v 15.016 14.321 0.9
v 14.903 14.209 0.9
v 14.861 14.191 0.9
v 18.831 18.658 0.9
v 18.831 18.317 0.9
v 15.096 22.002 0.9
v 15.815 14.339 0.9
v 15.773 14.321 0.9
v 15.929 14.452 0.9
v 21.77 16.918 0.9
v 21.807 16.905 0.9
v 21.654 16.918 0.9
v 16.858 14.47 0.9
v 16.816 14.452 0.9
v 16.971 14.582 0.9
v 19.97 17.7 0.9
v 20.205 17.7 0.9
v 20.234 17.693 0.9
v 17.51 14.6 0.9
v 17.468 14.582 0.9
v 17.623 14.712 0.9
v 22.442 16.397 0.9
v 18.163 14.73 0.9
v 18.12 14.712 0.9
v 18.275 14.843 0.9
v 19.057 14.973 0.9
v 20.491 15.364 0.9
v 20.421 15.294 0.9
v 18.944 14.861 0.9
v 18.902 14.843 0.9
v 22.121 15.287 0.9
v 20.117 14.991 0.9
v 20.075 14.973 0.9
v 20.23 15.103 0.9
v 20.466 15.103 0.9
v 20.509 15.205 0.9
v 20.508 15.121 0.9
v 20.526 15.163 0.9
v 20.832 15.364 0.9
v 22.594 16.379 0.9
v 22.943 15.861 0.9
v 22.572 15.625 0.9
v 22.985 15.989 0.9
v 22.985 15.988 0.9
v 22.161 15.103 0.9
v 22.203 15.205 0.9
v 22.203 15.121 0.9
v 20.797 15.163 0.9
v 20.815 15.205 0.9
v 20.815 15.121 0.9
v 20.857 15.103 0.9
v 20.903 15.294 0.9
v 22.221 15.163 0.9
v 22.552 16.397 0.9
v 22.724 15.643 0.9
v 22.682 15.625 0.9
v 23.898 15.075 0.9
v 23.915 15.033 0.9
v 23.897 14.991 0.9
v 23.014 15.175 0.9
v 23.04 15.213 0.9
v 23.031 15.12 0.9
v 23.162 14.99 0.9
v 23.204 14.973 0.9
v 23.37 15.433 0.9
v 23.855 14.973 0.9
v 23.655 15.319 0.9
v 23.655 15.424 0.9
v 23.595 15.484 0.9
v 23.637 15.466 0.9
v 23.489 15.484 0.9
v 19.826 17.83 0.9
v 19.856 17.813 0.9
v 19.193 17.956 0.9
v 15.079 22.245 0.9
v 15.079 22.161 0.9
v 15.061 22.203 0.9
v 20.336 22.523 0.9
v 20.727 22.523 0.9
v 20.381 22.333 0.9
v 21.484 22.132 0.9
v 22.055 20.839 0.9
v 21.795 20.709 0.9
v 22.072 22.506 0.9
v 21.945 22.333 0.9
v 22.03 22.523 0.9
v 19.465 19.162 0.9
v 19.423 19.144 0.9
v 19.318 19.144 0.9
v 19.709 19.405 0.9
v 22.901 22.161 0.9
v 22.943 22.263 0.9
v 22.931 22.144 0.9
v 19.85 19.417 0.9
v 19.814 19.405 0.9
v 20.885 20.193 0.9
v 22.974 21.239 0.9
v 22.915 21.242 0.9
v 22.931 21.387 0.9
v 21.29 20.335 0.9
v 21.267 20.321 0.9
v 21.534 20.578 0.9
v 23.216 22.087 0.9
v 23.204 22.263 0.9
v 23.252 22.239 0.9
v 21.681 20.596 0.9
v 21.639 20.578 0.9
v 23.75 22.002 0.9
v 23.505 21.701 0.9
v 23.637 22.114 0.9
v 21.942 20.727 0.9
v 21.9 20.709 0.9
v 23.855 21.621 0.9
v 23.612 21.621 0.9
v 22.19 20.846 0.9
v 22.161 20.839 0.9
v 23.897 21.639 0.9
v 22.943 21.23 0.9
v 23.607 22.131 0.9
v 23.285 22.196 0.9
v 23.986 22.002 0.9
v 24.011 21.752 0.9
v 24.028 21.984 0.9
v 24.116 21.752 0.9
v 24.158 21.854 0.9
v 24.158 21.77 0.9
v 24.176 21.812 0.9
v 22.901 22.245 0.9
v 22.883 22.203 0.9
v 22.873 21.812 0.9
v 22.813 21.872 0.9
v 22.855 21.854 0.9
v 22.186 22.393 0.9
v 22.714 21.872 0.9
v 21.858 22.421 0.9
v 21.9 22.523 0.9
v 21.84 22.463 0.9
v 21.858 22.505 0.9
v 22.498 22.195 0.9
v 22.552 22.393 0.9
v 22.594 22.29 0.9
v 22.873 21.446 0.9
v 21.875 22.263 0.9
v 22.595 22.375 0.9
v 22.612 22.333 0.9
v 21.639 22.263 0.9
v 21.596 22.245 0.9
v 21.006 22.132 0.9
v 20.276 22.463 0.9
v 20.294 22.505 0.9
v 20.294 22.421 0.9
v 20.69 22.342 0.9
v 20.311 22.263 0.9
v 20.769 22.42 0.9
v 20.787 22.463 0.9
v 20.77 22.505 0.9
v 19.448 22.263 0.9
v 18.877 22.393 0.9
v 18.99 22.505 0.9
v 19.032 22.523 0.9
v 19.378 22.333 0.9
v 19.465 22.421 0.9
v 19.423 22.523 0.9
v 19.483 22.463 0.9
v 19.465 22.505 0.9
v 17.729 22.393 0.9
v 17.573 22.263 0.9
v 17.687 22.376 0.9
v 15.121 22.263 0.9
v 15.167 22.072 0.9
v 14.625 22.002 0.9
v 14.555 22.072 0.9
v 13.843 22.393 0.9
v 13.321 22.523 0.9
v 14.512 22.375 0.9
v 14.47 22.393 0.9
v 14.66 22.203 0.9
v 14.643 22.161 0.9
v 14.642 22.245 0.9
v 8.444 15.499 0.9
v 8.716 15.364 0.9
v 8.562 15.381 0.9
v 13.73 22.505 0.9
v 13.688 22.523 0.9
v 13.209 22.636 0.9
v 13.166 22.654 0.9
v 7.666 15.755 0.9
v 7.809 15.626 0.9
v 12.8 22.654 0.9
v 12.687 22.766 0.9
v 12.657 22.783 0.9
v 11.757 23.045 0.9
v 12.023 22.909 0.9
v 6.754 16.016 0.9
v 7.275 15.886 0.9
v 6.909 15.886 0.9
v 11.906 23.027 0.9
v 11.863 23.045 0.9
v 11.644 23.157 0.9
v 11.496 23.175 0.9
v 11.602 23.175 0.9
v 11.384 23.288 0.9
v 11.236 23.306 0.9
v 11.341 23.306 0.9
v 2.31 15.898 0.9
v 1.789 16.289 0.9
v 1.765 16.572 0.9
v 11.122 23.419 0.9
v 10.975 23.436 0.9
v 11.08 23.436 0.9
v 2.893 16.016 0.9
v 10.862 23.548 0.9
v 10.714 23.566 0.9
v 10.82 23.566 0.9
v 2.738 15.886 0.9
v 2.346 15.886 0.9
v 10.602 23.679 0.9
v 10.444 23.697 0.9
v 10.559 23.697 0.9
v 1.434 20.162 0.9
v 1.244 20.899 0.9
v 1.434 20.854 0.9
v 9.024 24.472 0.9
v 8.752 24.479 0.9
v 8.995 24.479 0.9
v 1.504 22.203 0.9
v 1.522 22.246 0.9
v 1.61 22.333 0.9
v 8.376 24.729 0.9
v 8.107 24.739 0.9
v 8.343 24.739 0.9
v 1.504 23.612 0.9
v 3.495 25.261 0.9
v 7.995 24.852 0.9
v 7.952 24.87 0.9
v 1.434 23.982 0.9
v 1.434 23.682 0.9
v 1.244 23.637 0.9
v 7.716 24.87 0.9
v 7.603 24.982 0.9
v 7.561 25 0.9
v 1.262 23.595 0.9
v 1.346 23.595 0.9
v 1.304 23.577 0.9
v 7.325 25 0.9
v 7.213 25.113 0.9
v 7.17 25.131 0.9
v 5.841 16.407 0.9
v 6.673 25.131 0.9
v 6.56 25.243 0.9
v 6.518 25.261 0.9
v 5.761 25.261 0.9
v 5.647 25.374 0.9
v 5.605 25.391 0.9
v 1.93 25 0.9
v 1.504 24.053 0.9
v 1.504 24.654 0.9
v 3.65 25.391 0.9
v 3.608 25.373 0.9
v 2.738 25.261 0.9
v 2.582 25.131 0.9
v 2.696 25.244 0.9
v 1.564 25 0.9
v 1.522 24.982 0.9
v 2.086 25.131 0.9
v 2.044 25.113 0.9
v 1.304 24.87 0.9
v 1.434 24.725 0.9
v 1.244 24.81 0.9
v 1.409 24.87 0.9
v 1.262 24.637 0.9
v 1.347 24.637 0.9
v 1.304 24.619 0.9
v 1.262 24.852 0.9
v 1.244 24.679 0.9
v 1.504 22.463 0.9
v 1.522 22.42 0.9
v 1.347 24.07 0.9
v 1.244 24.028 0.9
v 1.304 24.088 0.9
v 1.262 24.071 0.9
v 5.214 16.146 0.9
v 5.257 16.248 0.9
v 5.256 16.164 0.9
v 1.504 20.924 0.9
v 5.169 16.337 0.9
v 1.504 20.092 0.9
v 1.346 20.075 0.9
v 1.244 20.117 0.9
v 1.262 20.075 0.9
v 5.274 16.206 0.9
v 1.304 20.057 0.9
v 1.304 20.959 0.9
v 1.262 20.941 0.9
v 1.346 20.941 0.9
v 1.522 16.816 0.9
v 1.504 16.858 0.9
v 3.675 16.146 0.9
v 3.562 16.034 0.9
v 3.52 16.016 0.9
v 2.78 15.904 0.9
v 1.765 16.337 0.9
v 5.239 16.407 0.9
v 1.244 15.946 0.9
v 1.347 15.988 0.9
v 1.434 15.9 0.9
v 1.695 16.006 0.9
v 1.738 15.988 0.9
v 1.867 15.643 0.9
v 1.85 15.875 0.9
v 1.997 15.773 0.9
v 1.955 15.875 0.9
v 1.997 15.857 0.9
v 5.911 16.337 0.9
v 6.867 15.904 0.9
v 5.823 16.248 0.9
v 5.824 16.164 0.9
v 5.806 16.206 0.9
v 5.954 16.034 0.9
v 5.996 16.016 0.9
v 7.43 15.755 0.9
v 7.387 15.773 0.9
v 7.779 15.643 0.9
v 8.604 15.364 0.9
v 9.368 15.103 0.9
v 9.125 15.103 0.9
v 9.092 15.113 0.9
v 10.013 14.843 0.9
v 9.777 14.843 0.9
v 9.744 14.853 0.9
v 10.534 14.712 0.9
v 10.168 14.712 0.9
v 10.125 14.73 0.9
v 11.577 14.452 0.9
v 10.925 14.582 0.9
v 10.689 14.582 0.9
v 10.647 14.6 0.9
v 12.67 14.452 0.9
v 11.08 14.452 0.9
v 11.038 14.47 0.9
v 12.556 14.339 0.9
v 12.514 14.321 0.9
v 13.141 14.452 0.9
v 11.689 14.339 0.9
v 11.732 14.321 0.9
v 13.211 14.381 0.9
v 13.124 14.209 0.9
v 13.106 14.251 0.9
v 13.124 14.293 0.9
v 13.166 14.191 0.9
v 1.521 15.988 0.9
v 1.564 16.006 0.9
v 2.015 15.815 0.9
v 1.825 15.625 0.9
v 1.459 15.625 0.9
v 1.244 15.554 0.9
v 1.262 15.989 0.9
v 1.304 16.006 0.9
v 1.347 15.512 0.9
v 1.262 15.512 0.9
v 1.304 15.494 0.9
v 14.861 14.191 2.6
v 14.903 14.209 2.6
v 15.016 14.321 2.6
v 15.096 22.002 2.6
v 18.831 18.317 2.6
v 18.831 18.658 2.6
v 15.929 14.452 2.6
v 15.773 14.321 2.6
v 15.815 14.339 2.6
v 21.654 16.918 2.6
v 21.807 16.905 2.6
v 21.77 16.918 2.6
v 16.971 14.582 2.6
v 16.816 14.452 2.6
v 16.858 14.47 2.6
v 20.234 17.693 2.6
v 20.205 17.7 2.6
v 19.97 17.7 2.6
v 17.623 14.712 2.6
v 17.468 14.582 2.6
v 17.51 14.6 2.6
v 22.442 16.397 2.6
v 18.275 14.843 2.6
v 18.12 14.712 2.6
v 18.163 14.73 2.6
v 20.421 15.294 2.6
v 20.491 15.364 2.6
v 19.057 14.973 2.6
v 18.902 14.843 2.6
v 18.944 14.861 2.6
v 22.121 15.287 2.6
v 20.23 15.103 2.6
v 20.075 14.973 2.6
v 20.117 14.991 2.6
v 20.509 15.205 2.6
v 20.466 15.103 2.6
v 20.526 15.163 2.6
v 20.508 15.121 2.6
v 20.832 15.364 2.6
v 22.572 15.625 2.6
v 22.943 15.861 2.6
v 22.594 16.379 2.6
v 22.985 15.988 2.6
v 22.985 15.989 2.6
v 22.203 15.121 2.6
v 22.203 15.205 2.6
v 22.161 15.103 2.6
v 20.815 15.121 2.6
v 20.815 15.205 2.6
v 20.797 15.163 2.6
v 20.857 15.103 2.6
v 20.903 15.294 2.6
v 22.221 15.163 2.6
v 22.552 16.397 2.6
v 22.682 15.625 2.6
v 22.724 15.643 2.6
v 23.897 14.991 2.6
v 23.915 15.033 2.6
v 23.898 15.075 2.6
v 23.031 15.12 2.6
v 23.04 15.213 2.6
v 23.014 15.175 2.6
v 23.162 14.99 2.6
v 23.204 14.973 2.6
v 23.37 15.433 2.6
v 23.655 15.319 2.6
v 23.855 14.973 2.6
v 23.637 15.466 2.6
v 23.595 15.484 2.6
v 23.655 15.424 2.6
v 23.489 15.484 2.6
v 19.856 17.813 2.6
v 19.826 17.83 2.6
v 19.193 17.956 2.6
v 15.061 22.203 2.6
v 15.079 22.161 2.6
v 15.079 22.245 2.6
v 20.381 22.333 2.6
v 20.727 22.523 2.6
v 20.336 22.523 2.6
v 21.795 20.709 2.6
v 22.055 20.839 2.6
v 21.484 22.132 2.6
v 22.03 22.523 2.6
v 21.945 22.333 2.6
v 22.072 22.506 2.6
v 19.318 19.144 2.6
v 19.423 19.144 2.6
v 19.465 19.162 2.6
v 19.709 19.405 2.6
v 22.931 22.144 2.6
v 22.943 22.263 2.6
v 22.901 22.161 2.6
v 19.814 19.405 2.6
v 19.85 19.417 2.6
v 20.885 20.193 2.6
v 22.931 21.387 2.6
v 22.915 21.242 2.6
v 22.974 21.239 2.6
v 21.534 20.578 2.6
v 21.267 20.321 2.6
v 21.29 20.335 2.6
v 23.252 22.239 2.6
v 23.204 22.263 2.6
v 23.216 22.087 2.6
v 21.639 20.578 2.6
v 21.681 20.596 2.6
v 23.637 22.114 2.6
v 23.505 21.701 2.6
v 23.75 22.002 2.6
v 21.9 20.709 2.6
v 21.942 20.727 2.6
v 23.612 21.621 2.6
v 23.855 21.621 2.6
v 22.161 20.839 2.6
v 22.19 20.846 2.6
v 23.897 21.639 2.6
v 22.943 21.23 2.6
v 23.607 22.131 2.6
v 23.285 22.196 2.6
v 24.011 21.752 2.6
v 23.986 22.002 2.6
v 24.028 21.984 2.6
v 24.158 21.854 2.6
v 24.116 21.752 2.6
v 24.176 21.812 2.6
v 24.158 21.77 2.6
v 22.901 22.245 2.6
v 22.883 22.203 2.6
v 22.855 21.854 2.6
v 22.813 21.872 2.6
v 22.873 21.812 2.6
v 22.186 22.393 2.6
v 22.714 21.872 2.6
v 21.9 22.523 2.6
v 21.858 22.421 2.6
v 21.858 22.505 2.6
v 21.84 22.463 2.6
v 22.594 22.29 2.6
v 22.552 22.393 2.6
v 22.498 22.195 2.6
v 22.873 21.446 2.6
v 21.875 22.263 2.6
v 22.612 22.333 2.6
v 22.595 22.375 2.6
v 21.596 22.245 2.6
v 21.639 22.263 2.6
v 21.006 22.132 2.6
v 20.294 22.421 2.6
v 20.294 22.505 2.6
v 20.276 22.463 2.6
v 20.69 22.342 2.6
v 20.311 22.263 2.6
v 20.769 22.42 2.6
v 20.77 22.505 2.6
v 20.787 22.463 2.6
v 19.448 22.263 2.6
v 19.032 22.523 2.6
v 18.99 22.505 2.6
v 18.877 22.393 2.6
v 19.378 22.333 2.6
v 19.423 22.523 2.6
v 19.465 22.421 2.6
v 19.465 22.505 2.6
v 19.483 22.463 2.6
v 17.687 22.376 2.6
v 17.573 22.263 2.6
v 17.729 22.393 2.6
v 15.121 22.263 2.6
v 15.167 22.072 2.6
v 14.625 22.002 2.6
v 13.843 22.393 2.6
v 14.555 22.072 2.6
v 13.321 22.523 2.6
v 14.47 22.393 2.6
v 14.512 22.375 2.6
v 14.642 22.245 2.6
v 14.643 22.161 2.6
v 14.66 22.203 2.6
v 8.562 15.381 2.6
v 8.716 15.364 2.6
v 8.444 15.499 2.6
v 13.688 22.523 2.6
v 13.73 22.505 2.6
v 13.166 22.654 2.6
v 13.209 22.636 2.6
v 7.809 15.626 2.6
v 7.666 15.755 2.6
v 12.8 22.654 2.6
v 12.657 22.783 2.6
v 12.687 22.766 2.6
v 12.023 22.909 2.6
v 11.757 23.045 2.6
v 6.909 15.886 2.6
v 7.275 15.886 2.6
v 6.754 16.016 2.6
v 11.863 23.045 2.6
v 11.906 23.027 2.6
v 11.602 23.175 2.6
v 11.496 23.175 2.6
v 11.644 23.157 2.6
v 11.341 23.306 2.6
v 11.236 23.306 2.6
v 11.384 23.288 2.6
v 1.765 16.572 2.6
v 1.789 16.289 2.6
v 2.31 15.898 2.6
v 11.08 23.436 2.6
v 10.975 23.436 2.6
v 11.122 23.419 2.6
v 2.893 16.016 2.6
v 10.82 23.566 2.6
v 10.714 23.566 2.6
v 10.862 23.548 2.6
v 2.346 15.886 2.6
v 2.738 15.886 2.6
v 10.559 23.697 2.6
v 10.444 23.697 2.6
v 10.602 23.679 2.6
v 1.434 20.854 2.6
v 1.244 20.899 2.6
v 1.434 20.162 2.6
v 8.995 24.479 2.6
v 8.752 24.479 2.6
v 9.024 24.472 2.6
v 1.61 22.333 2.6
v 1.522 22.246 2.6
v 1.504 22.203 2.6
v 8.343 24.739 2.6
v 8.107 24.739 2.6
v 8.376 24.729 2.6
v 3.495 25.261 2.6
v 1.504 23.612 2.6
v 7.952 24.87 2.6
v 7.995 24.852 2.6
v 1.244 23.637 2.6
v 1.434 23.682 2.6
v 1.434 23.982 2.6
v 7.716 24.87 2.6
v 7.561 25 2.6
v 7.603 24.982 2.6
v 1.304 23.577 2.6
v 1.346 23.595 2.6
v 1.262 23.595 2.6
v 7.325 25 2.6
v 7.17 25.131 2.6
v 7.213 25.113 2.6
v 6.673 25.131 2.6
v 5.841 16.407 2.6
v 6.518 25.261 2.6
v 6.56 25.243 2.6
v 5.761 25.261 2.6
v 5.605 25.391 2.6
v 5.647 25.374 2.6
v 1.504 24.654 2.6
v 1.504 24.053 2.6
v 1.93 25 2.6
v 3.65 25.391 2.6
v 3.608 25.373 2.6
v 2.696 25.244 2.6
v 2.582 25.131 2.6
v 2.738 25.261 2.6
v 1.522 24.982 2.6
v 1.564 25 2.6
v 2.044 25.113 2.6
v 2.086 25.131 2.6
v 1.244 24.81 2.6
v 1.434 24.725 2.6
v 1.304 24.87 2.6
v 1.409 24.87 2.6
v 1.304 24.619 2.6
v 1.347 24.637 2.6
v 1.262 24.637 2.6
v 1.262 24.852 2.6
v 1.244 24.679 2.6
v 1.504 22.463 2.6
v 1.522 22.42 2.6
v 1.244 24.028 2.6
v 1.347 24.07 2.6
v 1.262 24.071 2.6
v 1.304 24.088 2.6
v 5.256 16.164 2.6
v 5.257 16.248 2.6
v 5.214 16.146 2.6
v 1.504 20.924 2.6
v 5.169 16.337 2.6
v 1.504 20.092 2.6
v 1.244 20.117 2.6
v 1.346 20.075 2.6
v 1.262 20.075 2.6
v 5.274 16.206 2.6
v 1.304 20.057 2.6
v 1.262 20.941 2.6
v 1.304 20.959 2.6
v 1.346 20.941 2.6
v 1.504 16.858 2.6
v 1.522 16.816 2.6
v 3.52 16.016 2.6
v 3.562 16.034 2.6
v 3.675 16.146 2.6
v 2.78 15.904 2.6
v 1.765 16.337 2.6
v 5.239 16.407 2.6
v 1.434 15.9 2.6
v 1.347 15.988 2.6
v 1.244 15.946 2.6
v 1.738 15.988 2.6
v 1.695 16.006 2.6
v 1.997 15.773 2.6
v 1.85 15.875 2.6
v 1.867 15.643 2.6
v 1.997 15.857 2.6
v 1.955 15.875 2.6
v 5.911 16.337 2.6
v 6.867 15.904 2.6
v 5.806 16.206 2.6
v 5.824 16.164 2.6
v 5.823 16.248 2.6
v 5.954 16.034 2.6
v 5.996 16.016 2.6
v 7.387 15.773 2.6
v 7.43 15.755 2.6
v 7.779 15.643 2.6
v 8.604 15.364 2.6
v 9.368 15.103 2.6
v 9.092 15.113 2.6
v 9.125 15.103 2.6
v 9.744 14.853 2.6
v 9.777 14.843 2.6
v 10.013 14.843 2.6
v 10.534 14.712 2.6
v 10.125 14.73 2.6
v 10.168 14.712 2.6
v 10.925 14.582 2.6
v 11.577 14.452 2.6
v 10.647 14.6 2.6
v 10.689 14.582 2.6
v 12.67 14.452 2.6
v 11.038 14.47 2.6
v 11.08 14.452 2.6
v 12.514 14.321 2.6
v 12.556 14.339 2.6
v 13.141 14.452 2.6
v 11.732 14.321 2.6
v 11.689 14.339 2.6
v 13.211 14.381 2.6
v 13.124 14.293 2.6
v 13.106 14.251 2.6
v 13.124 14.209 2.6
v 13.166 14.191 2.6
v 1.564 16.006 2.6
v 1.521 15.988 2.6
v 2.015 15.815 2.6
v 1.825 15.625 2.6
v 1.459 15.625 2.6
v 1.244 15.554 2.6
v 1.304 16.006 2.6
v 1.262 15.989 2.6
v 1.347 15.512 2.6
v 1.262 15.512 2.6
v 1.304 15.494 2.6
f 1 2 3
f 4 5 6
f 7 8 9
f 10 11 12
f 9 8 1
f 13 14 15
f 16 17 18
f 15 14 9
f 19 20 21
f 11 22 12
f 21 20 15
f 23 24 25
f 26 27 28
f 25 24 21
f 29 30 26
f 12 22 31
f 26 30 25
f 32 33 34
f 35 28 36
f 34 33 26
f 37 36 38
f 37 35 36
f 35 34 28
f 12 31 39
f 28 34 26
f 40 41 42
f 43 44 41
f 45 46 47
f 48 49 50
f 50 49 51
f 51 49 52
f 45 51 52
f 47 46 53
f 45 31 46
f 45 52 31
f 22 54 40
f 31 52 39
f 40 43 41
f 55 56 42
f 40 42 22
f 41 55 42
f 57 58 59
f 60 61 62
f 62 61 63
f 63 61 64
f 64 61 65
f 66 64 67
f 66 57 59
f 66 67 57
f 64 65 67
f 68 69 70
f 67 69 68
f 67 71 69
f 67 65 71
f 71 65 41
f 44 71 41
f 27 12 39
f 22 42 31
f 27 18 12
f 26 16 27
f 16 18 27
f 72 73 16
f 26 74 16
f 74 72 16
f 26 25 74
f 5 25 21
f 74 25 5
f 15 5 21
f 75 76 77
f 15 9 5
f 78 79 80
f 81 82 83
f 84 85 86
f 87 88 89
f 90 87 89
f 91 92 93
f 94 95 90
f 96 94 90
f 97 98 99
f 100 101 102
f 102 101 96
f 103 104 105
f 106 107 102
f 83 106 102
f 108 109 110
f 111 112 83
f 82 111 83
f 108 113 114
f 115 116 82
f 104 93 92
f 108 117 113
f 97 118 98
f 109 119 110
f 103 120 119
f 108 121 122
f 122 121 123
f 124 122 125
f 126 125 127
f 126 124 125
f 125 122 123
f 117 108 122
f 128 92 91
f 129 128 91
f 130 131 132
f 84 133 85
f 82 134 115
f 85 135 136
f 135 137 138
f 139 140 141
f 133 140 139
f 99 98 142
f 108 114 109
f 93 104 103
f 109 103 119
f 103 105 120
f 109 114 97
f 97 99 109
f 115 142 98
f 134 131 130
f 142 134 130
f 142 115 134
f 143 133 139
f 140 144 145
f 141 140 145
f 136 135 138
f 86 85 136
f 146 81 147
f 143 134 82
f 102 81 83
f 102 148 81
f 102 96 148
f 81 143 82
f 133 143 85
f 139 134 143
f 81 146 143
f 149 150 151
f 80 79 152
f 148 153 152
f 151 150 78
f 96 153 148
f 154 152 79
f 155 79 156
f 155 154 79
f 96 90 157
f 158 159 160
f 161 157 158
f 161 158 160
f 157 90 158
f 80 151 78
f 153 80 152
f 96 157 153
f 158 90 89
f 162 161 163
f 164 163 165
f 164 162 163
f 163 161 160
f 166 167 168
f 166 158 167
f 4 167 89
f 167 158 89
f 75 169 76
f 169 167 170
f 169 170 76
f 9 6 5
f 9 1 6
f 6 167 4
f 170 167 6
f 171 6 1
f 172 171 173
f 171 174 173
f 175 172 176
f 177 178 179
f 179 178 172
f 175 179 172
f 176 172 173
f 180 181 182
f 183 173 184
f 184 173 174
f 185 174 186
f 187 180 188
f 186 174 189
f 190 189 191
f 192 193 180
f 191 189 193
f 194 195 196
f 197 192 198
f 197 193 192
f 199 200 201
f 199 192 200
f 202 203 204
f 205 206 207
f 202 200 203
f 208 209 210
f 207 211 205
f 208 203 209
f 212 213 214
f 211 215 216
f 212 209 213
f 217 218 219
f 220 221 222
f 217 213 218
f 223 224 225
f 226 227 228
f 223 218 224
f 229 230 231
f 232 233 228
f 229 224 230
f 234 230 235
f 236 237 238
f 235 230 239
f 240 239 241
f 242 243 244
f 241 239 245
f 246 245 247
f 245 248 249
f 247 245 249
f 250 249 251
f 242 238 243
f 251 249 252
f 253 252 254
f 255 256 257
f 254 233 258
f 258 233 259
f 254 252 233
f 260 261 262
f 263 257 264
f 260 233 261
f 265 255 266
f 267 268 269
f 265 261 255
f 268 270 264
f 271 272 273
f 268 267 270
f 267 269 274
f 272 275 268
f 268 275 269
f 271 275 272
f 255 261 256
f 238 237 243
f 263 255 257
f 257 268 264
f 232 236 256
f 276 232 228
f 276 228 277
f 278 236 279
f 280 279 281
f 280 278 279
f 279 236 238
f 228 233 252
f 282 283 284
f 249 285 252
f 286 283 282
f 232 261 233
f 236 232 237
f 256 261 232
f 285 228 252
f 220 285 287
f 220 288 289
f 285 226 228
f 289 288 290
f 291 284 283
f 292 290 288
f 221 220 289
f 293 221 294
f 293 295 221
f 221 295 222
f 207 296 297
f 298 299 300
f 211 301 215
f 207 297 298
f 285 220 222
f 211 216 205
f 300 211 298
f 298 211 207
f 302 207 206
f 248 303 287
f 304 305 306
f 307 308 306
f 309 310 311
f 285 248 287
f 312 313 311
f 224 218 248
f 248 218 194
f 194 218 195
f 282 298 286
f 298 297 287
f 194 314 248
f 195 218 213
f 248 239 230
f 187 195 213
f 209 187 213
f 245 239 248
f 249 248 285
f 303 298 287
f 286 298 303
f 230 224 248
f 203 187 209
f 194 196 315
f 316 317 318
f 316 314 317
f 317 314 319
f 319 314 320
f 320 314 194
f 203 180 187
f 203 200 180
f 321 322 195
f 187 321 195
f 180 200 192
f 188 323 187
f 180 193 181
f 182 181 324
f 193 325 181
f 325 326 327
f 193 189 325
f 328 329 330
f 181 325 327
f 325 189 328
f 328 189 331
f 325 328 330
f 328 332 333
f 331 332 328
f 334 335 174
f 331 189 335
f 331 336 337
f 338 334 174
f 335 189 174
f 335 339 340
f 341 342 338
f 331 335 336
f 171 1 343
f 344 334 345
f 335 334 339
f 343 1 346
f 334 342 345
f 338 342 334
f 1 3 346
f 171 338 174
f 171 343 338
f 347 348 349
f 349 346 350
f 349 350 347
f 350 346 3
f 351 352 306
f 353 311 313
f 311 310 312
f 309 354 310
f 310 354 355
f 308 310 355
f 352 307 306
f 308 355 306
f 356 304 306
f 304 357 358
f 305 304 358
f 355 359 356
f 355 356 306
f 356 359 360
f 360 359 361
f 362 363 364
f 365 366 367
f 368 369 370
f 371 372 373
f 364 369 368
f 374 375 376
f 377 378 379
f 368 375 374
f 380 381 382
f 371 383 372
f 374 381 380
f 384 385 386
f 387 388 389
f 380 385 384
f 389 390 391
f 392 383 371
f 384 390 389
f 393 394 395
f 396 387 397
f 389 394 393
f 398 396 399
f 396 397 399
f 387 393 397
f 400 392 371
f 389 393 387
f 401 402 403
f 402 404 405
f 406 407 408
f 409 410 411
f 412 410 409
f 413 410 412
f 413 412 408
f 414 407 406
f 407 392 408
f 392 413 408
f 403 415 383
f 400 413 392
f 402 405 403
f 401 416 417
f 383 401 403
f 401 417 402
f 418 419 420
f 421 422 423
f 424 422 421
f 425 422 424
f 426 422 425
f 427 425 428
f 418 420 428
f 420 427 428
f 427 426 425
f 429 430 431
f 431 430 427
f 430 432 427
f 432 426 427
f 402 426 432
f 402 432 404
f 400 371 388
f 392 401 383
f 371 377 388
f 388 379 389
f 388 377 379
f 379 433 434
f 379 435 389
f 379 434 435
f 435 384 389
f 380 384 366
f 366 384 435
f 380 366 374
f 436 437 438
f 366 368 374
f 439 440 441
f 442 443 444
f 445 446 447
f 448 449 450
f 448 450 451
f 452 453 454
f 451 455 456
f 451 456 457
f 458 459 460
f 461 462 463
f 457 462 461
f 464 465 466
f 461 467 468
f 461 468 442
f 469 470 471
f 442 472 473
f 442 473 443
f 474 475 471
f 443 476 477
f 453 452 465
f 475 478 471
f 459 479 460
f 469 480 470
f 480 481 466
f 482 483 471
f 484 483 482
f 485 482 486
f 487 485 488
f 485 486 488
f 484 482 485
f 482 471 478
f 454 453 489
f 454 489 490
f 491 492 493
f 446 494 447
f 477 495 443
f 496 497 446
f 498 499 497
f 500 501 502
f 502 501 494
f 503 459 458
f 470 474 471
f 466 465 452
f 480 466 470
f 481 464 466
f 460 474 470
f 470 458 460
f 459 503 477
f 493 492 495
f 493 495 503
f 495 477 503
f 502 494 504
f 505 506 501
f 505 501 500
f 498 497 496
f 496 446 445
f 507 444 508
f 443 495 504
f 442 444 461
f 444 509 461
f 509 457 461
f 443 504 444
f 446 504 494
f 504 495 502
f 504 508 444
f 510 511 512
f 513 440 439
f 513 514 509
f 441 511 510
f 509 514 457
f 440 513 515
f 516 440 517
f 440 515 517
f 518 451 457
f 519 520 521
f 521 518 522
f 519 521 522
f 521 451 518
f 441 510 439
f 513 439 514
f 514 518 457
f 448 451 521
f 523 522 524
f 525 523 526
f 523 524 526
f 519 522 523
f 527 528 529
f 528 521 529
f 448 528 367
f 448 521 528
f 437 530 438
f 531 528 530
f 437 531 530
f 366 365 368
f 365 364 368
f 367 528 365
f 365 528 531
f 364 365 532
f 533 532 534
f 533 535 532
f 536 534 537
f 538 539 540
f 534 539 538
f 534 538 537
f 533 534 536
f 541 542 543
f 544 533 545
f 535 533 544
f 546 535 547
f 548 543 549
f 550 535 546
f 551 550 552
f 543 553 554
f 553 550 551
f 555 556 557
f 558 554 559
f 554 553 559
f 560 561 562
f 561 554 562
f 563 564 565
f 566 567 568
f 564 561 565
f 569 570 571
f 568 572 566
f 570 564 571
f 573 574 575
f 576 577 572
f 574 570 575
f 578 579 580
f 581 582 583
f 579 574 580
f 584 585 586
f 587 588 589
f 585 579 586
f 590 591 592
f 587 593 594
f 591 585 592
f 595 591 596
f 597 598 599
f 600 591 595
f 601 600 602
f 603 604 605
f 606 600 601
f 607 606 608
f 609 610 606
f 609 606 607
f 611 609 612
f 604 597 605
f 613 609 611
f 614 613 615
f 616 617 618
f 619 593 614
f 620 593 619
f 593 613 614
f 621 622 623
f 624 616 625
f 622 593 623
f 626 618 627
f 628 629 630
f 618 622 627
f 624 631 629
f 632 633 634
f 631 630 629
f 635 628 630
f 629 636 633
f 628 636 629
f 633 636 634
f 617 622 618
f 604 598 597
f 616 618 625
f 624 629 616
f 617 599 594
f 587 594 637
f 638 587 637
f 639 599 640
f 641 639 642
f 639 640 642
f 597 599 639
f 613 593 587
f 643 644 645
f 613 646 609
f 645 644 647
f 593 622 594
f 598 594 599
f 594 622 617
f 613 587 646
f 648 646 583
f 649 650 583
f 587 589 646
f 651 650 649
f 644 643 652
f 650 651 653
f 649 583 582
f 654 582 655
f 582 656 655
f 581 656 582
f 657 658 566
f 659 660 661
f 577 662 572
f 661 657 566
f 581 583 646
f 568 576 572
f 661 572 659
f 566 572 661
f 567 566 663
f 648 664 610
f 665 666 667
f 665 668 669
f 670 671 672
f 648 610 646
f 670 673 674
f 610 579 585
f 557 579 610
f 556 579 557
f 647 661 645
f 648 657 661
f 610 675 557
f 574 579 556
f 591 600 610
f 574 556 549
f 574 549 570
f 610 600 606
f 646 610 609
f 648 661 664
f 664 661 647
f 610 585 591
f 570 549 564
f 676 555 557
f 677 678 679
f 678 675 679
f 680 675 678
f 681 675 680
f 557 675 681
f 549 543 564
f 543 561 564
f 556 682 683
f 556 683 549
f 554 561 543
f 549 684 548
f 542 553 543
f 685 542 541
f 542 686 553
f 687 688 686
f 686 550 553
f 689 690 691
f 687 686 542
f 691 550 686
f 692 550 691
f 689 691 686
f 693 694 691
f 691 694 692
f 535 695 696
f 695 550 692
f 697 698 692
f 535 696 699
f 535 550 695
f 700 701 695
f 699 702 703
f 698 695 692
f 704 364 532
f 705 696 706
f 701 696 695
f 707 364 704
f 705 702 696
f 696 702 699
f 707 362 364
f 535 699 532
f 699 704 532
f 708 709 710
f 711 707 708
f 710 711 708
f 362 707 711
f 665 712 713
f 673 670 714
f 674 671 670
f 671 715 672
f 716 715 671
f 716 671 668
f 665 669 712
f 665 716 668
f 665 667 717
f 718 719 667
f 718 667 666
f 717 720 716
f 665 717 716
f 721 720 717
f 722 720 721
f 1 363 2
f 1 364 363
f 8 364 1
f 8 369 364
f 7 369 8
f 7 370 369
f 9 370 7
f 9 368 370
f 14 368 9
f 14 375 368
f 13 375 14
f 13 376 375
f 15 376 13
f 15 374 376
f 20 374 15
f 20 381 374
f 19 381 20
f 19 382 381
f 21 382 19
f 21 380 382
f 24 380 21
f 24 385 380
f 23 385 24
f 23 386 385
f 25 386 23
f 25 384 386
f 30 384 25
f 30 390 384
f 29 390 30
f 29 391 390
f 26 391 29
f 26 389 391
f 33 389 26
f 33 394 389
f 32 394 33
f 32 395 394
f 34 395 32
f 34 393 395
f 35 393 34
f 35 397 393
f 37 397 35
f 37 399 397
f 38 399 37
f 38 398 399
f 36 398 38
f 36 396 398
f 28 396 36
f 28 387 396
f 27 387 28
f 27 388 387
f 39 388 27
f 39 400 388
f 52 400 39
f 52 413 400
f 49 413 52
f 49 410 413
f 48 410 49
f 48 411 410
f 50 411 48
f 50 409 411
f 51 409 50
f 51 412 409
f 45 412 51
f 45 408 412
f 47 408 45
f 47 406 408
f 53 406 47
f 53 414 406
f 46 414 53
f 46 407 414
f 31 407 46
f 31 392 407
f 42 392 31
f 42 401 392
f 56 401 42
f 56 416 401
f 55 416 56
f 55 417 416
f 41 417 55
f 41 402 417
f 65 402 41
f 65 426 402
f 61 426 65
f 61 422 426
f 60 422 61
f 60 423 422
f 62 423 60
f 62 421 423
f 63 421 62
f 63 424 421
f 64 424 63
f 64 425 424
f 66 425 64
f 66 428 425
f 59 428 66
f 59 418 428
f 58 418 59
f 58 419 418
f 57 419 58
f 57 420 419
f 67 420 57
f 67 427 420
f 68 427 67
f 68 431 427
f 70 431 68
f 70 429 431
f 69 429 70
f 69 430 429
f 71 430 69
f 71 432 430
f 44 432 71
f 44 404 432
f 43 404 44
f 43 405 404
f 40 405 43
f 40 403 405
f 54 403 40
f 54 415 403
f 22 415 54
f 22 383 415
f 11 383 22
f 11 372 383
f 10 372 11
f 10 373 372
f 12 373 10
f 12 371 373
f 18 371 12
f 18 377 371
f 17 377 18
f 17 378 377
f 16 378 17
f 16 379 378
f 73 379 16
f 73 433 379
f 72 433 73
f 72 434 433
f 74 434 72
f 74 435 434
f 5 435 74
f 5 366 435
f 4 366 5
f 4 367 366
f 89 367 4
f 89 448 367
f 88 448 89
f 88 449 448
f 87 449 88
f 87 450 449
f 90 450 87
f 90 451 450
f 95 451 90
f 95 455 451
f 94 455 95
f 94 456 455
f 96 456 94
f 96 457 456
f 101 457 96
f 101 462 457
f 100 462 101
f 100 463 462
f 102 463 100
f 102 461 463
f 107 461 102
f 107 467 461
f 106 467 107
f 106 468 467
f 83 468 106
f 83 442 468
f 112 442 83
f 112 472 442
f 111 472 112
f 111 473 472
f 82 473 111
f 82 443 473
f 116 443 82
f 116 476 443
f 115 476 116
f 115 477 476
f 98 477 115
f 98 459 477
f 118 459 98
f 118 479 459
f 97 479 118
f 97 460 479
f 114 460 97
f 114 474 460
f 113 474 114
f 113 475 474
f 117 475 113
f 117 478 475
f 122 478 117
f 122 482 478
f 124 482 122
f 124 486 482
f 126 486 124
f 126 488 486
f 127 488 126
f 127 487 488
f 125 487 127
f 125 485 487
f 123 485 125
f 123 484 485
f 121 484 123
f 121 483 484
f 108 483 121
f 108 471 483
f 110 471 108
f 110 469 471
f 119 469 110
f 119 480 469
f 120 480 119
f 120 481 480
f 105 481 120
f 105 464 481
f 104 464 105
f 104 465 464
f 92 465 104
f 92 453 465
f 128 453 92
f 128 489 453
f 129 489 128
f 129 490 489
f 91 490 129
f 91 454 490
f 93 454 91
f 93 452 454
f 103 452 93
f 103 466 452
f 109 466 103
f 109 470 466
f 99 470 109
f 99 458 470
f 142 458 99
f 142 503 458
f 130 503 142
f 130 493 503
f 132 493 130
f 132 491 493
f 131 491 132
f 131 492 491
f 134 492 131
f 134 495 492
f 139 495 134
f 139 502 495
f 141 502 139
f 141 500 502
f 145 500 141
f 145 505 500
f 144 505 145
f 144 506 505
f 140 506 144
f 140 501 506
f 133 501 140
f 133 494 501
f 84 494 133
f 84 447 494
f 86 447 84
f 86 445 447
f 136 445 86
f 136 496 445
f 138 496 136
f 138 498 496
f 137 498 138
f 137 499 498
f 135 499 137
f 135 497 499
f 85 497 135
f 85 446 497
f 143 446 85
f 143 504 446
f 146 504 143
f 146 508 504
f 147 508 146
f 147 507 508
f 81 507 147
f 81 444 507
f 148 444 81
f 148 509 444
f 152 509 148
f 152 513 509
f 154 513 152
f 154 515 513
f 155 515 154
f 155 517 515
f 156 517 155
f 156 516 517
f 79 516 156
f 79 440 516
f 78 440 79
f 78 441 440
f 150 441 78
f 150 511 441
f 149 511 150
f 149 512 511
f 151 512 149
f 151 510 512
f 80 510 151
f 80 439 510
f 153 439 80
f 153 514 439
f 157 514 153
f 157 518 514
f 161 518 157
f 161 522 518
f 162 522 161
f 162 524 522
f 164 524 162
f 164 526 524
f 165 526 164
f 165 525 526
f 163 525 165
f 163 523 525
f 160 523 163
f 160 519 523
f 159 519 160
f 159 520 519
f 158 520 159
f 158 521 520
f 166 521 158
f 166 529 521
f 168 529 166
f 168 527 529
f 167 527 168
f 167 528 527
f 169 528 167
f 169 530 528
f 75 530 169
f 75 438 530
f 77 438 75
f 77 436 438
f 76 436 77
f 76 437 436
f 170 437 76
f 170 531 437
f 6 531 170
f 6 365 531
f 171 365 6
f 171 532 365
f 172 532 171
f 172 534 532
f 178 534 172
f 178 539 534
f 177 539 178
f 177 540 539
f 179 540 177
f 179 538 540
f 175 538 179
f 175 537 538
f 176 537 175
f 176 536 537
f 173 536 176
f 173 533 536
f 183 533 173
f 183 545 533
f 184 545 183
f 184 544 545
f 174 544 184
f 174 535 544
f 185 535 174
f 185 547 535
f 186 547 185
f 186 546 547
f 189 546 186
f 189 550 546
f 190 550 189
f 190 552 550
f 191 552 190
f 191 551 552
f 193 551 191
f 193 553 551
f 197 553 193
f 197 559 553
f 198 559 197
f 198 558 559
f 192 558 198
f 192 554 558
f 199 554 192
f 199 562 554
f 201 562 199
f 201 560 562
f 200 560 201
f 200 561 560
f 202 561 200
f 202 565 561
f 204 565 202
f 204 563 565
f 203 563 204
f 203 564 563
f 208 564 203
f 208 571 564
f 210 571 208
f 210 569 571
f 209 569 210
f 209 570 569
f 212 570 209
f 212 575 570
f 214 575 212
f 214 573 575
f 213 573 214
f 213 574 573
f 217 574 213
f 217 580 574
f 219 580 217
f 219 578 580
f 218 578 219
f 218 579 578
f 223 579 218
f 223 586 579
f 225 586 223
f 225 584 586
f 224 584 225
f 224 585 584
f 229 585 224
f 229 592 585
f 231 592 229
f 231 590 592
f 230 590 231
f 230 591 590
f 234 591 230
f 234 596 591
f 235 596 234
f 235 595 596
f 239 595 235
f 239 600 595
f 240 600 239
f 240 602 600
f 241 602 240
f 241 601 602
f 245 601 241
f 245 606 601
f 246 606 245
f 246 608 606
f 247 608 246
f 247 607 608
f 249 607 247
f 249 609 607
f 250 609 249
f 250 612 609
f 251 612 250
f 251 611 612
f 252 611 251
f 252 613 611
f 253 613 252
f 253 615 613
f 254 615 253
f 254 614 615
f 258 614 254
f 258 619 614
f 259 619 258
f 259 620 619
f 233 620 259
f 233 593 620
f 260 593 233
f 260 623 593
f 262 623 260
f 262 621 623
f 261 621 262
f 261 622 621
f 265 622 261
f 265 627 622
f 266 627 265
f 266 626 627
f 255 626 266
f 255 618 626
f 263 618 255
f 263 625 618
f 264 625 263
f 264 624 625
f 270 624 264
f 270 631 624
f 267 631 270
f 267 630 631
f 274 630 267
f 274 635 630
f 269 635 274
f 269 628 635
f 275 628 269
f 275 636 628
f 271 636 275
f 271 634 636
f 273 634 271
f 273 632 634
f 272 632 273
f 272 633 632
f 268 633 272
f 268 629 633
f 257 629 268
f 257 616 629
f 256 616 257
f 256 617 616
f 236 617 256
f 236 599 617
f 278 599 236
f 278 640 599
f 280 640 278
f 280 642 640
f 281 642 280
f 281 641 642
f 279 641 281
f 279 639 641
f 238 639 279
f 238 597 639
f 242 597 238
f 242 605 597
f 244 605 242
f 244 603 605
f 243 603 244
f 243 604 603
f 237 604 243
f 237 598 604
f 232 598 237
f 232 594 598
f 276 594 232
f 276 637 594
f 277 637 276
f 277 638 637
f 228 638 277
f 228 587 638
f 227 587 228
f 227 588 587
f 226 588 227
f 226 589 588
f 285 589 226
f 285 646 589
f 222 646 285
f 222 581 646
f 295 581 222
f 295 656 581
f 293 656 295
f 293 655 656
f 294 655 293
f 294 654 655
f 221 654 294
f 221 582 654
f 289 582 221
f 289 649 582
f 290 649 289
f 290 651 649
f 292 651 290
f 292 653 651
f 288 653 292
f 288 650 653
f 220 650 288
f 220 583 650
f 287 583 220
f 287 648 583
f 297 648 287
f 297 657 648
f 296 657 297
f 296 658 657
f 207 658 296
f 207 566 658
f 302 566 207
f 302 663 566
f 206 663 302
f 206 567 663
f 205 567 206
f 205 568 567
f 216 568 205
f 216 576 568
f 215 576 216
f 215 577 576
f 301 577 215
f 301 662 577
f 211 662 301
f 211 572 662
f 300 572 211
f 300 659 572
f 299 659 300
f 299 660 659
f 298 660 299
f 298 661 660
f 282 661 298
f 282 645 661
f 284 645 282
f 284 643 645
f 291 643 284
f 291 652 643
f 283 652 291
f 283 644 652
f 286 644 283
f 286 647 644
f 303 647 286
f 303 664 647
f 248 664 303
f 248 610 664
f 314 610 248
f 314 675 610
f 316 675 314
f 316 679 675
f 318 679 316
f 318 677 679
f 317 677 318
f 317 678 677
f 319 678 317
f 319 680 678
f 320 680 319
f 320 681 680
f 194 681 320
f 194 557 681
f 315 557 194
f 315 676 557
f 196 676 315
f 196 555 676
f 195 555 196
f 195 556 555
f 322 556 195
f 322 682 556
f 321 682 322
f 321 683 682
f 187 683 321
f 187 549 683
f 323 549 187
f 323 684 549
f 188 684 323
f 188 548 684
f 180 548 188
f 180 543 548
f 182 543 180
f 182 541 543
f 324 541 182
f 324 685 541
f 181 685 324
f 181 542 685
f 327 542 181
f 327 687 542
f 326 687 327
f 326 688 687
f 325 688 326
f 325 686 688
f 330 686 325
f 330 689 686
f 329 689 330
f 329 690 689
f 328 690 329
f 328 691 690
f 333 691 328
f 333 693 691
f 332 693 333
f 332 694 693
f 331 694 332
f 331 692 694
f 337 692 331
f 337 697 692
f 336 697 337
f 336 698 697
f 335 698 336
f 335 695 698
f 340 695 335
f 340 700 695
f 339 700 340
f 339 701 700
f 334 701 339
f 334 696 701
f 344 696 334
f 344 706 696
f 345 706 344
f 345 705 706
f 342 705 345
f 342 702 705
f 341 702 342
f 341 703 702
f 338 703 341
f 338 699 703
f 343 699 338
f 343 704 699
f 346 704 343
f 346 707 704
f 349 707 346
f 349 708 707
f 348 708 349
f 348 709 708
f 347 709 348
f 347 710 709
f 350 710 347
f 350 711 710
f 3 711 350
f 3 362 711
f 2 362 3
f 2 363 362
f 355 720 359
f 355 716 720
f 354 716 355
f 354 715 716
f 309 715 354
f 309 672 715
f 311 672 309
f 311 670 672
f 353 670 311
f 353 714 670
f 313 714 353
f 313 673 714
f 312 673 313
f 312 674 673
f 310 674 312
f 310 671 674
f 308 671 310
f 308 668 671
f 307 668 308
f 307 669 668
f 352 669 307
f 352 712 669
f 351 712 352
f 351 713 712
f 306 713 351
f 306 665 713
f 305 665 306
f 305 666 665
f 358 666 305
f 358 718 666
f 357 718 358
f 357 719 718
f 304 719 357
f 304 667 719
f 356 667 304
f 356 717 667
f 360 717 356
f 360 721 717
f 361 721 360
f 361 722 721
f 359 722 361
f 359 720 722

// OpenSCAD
$fn = 24;
translate([0, -2.500, 0.900])
  linear_extrude(height=1.700) {
offset(r=0.06, $fn=8) {
    polygon(points=[[1.304,27.310],[1.304,18.054],[1.434,18.185],[1.825,18.185],[1.955,18.315],[2.216,18.315],[2.346,18.446],[2.738,18.446],[2.868,18.576],[3.520,18.576],[3.650,18.706],[5.866,18.706],[5.996,18.576],[6.779,18.576],[6.909,18.446],[7.300,18.446],[7.430,18.315],[7.691,18.315],[7.821,18.185],[8.473,18.054],[8.604,17.924],[8.734,17.924],[9.125,17.663],[9.386,17.663],[9.777,17.403],[10.038,17.403],[10.168,17.272],[10.559,17.272],[10.689,17.142],[10.950,17.142],[11.080,17.012],[11.602,17.012],[11.732,16.881],[12.514,16.881],[12.645,17.012],[13.166,17.012],[13.296,16.881],[13.166,16.751],[12.905,16.751],[14.861,16.751],[14.991,16.881],[15.773,16.881],[15.904,17.012],[16.816,17.012],[16.946,17.142],[17.468,17.142],[17.598,17.272],[18.120,17.272],[18.250,17.403],[18.902,17.403],[19.032,17.533],[20.075,17.533],[20.205,17.663],[23.073,17.663],[23.204,17.533],[23.855,17.533],[23.595,17.794],[23.595,17.924],[23.464,17.924],[22.552,18.837],[22.421,18.837],[21.770,19.358],[21.639,19.358],[20.205,20.140],[19.945,20.140],[19.814,20.271],[19.163,20.401],[18.771,20.792],[18.771,21.183],[19.293,21.704],[19.423,21.704],[19.684,21.965],[19.814,21.965],[20.857,22.747],[21.248,22.878],[21.509,23.138],[21.639,23.138],[21.770,23.269],[21.900,23.269],[22.030,23.399],[22.161,23.399],[23.595,24.181],[23.855,24.181],[23.986,24.312],[24.116,24.312],[23.986,24.442],[23.725,24.442],[23.595,24.572],[22.943,24.703],[23.204,24.703],[23.595,24.181],[22.943,23.790],[22.813,23.921],[22.813,24.312],[22.682,24.312],[22.421,24.703],[22.552,24.833],[22.682,24.833],[22.161,24.833],[22.030,24.963],[19.032,24.963],[18.902,24.833],[17.729,24.833],[17.598,24.703],[14.600,24.703],[14.470,24.833],[13.818,24.833],[13.688,24.963],[13.296,24.963],[13.166,25.094],[12.775,25.094],[12.645,25.224],[11.993,25.354],[11.863,25.485],[11.732,25.485],[11.602,25.615],[11.471,25.615],[11.341,25.746],[11.211,25.746],[11.080,25.876],[10.950,25.876],[10.820,26.006],[10.689,26.006],[10.559,26.137],[10.429,26.137],[8.995,26.919],[8.734,26.919],[8.343,27.179],[8.082,27.179],[7.952,27.310],[7.691,27.310],[7.561,27.440],[7.300,27.440],[7.170,27.571],[6.648,27.571],[6.518,27.701],[5.736,27.701],[5.605,27.831],[3.650,27.831],[3.520,27.701],[2.738,27.701],[2.607,27.571],[2.086,27.571],[1.955,27.440],[1.564,27.440],[1.434,27.310],[20.336,17.794],[20.466,17.924],[20.857,17.924],[20.988,17.794],[20.857,17.663],[20.466,17.663],[23.464,17.924],[23.073,17.663],[22.161,17.663],[22.030,17.794],[22.552,18.185],[22.682,18.185],[22.943,18.446],[5.084,18.837],[5.214,18.967],[5.866,18.967],[5.996,18.837],[5.866,18.706],[5.214,18.706],[1.434,22.747],[1.564,22.617],[1.564,19.358],[1.825,19.097],[1.825,18.837],[2.346,18.446],[2.216,18.315],[1.825,18.315],[1.695,18.446],[1.564,18.446],[1.434,18.315],[1.304,18.446],[1.304,22.617],[14.470,24.572],[14.600,24.703],[15.121,24.703],[15.252,24.572],[15.121,24.442],[14.600,24.442],[20.596,24.833],[20.727,24.963],[21.900,24.963],[22.030,24.833],[21.900,24.703],[21.639,24.703],[21.509,24.572],[20.988,24.572],[19.293,24.833],[19.423,24.963],[20.336,24.963],[20.466,24.833],[20.336,24.703],[19.423,24.703],[1.434,26.267],[1.564,26.137],[1.564,24.963],[1.695,24.833],[1.564,24.703],[1.564,23.399],[1.434,23.269],[1.304,23.399],[1.304,26.137],[1.434,27.310],[1.564,27.179],[1.564,26.528],[1.434,26.397],[1.304,26.528],[1.304,27.179]], paths=[[0,1,2,3,4,5,6,7,8,9,10,11,12,13,14,15,16,17,18,19,20,21,22,23,24,25,26,27,28,29,30,31,32,33,34,35,36,37,38,39,40,41,42,43,44,45,46,47,48,49,50,51,52,53,54,55,56,57,58,59,60,61,62,63,64,65,66,67,68,69,70,71,72,73,74,75,76,77,78,79,80,81,82,83,84,85,86,87,88,89,90,91,92,93,94,95,96,97,98,99,100,101,102,103,104,105,106,107,108,109,110,111,112,113,114,115,116,117,118,119,120,121,122,123,124,125,126,127,128,129,130,131,132,133,134,135,136,137,138,139,140,141,142,143,144,145],[146,147,148,149,150,151],[152,153,154,155,156,157,158],[159,160,161,162,163,164],[165,166,167,168,169,170,171,172,173,174,175,176,177],[178,179,180,181,182,183],[184,185,186,187,188,189,190,191],[192,193,194,195,196,197],[198,199,200,201,202,203,204,205,206],[207,208,209,210,211,212]]);
}
}
